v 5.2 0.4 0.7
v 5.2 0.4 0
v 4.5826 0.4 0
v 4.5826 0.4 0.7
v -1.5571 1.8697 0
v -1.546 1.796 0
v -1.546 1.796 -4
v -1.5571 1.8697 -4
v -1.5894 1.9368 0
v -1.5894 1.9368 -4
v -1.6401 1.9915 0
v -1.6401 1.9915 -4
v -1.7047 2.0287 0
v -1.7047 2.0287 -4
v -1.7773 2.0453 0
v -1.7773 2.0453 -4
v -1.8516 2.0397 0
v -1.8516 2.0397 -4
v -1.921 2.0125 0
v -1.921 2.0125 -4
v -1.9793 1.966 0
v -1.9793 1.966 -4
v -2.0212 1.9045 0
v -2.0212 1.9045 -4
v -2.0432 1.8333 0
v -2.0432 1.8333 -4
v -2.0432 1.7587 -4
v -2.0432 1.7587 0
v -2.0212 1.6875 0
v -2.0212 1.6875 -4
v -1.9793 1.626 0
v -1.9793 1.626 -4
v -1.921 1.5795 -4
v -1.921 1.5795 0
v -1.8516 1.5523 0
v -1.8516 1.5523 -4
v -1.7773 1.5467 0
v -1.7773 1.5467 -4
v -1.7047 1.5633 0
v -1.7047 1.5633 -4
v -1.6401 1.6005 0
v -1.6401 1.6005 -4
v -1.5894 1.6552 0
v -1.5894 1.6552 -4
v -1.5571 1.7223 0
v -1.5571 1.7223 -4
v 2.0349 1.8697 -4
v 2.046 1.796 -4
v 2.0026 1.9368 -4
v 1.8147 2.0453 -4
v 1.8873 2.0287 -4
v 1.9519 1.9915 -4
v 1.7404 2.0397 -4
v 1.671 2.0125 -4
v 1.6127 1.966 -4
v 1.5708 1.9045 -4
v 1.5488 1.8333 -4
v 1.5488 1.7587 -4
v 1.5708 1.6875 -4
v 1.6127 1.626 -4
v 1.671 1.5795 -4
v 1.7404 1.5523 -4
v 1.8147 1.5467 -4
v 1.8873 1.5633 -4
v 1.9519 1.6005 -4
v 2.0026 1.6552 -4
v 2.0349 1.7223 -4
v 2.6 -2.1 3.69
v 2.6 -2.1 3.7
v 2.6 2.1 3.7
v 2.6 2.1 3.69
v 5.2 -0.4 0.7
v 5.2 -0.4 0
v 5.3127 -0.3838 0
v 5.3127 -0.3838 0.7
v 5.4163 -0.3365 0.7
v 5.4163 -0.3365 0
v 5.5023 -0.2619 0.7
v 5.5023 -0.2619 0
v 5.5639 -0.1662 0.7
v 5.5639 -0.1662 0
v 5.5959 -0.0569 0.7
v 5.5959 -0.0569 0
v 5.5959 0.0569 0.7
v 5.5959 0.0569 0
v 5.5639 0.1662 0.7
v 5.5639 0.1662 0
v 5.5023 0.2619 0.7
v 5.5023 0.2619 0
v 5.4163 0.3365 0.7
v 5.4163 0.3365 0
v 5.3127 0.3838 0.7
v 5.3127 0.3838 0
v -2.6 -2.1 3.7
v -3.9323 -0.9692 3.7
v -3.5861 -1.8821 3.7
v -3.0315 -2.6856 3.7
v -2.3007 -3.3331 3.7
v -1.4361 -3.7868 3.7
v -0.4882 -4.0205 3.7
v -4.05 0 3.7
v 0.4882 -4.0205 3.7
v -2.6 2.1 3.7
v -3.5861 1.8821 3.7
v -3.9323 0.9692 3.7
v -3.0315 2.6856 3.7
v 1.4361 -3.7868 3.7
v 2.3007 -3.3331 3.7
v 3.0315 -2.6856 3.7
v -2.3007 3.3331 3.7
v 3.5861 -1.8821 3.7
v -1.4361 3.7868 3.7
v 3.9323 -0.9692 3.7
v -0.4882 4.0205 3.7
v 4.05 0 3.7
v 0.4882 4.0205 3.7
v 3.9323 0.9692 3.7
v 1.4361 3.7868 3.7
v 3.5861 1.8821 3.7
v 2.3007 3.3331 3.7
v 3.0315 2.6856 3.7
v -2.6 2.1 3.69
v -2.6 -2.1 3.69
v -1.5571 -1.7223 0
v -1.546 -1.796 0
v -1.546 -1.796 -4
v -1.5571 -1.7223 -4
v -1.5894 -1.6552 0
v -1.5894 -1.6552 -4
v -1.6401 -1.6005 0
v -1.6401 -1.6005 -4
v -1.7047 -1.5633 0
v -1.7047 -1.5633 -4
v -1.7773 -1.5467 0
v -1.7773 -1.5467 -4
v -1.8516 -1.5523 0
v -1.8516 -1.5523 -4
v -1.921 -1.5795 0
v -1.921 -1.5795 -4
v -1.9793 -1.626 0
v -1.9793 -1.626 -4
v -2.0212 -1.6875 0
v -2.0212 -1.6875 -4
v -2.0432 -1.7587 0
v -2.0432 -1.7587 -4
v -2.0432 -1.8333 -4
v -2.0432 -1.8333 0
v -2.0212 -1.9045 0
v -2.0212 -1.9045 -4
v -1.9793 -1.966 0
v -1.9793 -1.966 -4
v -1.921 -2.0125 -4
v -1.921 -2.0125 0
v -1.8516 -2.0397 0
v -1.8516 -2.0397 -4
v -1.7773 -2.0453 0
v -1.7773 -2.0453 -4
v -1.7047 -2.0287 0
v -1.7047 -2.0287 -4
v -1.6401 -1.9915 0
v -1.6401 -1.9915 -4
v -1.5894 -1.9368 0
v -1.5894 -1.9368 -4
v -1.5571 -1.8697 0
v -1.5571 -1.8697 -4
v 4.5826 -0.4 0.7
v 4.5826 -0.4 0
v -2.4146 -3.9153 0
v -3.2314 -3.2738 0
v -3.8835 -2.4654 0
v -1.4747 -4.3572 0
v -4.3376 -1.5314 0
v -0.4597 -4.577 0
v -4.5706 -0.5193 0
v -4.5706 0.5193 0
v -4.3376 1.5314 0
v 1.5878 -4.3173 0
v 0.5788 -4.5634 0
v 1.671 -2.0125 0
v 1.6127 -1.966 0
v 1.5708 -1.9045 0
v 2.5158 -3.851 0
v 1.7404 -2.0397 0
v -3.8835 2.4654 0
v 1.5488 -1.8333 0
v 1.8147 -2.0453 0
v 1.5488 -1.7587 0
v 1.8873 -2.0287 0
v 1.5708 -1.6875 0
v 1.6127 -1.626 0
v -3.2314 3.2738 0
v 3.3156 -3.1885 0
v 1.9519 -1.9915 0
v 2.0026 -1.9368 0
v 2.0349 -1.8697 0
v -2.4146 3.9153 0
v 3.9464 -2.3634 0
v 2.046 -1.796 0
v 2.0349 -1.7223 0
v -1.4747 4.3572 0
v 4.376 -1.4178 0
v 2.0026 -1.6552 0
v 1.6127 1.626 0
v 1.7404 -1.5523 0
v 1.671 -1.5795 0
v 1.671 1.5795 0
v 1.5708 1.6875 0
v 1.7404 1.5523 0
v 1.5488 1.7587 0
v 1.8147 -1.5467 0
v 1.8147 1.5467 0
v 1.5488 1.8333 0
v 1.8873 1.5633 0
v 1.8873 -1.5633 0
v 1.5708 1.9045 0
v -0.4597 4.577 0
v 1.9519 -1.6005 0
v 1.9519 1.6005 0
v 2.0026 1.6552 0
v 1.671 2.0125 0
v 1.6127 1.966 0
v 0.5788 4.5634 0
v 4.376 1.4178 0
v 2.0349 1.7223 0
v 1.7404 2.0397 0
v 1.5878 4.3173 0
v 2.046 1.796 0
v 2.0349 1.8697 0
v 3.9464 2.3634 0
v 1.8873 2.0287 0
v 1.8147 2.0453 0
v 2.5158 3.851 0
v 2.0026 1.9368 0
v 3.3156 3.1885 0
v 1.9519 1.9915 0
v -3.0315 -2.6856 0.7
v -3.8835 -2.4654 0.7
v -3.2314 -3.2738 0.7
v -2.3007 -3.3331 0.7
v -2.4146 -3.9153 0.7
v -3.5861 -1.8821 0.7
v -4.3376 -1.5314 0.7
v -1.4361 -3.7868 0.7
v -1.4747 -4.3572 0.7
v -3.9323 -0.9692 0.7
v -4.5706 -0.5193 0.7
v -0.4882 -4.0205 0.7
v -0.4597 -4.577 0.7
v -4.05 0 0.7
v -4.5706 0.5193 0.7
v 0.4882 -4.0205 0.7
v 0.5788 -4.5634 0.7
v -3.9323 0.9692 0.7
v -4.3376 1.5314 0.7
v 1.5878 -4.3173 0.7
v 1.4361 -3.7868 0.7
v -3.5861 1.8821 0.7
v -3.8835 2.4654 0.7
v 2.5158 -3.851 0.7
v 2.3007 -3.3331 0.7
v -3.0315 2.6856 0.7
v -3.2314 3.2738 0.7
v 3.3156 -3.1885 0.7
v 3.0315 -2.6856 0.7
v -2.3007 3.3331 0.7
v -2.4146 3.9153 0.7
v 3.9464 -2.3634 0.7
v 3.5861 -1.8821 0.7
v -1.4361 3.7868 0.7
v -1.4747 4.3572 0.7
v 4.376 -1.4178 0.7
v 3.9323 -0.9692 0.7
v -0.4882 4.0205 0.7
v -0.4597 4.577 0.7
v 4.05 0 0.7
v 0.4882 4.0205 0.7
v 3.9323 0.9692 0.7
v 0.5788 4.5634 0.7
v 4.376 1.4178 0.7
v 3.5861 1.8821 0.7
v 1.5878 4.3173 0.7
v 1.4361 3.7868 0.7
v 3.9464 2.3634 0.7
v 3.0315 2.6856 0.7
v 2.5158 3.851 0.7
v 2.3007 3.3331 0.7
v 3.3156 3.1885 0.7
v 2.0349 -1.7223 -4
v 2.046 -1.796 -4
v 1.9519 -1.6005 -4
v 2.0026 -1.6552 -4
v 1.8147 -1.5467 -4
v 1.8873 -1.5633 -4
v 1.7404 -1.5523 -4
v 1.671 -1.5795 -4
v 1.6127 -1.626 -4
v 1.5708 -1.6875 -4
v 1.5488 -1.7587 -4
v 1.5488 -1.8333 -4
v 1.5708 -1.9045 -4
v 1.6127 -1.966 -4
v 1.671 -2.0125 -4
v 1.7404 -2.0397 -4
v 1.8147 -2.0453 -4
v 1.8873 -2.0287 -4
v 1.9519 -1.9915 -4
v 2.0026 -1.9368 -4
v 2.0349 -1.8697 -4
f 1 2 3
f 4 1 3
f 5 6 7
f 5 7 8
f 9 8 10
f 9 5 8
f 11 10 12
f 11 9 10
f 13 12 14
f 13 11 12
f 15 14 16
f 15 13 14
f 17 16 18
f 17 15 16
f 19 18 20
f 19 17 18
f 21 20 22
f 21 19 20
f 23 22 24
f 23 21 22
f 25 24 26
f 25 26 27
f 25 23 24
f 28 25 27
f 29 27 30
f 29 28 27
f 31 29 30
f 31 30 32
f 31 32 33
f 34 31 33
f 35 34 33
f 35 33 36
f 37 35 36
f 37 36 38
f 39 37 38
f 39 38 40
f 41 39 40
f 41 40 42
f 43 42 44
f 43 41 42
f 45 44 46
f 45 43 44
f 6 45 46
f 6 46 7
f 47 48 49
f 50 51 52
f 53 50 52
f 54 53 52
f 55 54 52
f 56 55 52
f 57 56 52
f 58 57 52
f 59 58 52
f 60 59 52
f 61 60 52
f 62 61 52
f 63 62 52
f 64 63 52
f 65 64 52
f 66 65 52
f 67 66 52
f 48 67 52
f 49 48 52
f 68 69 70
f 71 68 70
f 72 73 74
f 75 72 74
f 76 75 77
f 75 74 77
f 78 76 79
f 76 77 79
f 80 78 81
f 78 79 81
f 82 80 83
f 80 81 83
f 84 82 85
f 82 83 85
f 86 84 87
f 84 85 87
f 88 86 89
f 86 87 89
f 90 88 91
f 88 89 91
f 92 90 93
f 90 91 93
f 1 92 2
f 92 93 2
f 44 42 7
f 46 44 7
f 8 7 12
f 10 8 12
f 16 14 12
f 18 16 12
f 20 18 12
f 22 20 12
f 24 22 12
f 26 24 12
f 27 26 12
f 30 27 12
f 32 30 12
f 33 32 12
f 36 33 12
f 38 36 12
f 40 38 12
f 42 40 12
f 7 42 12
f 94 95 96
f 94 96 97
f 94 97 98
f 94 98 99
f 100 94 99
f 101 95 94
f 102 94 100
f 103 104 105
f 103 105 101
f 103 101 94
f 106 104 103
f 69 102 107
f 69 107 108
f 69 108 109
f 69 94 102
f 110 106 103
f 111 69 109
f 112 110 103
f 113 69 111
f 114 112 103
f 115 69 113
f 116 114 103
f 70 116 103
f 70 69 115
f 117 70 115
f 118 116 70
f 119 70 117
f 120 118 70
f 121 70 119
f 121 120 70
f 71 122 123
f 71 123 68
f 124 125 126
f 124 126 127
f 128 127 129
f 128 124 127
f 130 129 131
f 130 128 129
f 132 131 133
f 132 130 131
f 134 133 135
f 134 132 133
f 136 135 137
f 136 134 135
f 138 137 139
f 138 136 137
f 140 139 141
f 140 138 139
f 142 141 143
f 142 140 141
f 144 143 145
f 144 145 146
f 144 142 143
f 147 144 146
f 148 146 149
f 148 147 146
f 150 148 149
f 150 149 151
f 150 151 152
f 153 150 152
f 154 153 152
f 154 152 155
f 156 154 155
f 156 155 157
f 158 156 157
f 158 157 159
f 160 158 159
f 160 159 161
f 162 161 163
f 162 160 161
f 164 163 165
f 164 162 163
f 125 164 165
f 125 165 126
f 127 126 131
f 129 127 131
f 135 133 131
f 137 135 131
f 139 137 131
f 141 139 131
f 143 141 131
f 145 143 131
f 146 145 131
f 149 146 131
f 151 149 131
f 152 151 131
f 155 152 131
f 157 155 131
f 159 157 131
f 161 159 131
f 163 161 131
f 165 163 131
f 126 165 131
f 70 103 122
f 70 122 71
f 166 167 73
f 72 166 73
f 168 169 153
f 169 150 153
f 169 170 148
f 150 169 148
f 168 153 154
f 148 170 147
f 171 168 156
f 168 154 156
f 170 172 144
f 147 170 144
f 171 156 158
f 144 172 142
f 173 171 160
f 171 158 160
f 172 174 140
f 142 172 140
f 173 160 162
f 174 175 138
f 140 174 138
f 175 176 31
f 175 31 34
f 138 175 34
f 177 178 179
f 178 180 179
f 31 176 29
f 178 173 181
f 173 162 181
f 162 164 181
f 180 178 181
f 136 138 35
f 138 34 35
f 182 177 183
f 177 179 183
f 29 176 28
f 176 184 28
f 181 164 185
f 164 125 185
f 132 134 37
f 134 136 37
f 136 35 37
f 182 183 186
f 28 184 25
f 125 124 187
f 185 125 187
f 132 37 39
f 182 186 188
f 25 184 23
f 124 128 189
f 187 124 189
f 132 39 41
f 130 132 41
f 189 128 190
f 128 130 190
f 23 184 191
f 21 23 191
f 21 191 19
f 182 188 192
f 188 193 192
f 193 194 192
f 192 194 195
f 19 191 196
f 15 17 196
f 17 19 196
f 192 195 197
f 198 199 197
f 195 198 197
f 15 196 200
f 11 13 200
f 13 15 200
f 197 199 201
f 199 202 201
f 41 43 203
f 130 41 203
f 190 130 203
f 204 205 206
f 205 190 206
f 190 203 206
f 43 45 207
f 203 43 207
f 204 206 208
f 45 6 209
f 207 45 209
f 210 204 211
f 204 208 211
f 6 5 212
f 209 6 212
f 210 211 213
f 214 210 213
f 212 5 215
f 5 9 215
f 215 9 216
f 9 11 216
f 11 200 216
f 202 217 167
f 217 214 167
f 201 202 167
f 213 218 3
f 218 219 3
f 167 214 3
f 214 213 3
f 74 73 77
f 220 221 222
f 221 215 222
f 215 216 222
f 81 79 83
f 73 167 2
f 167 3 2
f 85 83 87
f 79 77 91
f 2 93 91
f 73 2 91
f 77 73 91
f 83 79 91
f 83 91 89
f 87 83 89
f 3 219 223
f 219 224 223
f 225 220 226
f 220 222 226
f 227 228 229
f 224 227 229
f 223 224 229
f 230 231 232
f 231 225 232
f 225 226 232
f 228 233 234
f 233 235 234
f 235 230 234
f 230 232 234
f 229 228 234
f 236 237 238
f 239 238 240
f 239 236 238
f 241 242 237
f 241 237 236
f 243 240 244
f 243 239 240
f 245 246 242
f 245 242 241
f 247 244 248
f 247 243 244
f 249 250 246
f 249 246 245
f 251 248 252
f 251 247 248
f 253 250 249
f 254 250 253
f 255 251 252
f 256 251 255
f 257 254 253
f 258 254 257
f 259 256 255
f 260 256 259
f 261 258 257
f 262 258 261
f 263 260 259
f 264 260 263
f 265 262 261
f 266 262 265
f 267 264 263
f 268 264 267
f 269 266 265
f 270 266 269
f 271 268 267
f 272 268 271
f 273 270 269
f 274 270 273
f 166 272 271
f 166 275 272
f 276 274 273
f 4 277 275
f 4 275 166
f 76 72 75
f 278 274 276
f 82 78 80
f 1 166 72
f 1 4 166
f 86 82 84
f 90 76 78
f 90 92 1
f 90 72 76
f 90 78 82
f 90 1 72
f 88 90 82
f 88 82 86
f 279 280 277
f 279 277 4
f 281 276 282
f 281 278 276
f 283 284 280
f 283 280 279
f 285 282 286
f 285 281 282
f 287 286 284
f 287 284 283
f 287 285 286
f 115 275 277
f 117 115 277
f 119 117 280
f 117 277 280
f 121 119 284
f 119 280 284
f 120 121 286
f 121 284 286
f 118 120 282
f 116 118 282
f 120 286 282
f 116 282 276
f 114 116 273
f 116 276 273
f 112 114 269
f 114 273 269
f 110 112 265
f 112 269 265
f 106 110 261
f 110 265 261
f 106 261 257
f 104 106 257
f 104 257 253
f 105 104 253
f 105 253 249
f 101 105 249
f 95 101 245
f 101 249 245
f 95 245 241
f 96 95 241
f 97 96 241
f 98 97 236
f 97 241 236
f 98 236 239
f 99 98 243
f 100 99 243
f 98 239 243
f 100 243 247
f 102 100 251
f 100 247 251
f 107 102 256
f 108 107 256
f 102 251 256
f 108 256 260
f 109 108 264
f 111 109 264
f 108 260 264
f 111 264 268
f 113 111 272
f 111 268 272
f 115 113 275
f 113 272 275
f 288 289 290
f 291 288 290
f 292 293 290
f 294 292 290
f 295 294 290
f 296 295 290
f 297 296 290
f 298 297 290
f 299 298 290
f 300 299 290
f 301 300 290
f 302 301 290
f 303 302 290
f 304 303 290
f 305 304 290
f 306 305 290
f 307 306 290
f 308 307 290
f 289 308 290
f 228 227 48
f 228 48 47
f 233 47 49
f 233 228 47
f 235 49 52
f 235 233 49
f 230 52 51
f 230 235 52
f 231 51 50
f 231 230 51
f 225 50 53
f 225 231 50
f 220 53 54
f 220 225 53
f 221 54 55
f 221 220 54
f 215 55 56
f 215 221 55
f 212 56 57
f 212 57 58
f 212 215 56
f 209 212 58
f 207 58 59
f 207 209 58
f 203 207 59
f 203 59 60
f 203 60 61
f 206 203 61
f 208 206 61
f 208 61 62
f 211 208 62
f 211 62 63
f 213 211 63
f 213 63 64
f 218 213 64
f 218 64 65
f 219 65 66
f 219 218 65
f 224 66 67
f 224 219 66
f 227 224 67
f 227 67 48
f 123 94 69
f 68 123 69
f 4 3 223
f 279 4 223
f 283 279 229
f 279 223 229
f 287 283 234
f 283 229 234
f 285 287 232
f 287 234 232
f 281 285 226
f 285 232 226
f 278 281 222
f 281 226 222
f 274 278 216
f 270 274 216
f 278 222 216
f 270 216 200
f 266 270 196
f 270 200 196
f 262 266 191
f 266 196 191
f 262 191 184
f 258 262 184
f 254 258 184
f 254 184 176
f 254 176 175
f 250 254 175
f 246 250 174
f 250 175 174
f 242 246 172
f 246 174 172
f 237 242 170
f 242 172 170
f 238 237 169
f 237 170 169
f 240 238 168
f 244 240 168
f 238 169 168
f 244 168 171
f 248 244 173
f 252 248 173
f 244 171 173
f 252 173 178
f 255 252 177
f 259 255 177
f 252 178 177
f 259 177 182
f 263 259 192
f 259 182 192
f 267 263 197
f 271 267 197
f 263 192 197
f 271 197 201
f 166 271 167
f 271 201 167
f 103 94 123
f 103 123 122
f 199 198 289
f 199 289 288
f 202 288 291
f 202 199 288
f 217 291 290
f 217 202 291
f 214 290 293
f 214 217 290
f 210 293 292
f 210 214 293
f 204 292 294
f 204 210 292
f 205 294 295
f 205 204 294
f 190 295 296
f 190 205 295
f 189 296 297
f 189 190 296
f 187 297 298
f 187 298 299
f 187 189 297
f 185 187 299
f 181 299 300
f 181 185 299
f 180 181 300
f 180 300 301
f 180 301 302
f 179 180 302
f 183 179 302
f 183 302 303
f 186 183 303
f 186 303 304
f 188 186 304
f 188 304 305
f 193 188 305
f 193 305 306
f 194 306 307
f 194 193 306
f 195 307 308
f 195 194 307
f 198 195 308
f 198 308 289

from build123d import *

# Parameters (mm, degrees)
EXTRUDE_1_DEPTH     = 0.7
SKETCH_2_R          = 4.05
EXTRUDE_2_DEPTH     = 3
SKETCH_3_W          = 5.2
SKETCH_3_H          = 4.2
CUT_EXTRUDE_1_DEPTH = 0.01
SKETCH_4_R          = 0.25
EXTRUDE_3_DEPTH     = 4


with BuildPart() as part:
    # Эскиз1 → Бобышка-Вытянуть1 (new body)
    with BuildSketch(Plane.XY):
        with BuildLine():
            Line((5.2, 0.4), (4.582575695, 0.4))
            ThreePointArc((4.582575695, 0.4), (-4.6, 0), (4.582575695, -0.4))
            Line((4.582575695, -0.4), (5.2, -0.4))
            ThreePointArc((5.2, -0.4), (5.6, 0), (5.2, 0.4))
        make_face()
    extrude(amount=EXTRUDE_1_DEPTH)

    # Эскиз2 → Бобышка-Вытянуть2 (add)
    with BuildSketch(Plane.XY.offset(0.7)):
        Circle(SKETCH_2_R)
    extrude(amount=EXTRUDE_2_DEPTH)

    # Эскиз3 → Вырез-Вытянуть1 (cut)
    with BuildSketch(Plane.XY.offset(3.7)):
        Rectangle(SKETCH_3_W, SKETCH_3_H)
    extrude(amount=-CUT_EXTRUDE_1_DEPTH, mode=Mode.SUBTRACT)

    # Эскиз4 → Бобышка-Вытянуть3 (add)
    with BuildSketch(Plane.XY):
        with Locations((1.796, -1.796)):
            Circle(SKETCH_4_R)
        with Locations((1.796, 1.796)):
            Circle(SKETCH_4_R)
        with Locations((-1.796, 1.796)):
            Circle(SKETCH_4_R)
        with Locations((-1.796, -1.796)):
            Circle(SKETCH_4_R)
    extrude(amount=-EXTRUDE_3_DEPTH)


solid = part.part
